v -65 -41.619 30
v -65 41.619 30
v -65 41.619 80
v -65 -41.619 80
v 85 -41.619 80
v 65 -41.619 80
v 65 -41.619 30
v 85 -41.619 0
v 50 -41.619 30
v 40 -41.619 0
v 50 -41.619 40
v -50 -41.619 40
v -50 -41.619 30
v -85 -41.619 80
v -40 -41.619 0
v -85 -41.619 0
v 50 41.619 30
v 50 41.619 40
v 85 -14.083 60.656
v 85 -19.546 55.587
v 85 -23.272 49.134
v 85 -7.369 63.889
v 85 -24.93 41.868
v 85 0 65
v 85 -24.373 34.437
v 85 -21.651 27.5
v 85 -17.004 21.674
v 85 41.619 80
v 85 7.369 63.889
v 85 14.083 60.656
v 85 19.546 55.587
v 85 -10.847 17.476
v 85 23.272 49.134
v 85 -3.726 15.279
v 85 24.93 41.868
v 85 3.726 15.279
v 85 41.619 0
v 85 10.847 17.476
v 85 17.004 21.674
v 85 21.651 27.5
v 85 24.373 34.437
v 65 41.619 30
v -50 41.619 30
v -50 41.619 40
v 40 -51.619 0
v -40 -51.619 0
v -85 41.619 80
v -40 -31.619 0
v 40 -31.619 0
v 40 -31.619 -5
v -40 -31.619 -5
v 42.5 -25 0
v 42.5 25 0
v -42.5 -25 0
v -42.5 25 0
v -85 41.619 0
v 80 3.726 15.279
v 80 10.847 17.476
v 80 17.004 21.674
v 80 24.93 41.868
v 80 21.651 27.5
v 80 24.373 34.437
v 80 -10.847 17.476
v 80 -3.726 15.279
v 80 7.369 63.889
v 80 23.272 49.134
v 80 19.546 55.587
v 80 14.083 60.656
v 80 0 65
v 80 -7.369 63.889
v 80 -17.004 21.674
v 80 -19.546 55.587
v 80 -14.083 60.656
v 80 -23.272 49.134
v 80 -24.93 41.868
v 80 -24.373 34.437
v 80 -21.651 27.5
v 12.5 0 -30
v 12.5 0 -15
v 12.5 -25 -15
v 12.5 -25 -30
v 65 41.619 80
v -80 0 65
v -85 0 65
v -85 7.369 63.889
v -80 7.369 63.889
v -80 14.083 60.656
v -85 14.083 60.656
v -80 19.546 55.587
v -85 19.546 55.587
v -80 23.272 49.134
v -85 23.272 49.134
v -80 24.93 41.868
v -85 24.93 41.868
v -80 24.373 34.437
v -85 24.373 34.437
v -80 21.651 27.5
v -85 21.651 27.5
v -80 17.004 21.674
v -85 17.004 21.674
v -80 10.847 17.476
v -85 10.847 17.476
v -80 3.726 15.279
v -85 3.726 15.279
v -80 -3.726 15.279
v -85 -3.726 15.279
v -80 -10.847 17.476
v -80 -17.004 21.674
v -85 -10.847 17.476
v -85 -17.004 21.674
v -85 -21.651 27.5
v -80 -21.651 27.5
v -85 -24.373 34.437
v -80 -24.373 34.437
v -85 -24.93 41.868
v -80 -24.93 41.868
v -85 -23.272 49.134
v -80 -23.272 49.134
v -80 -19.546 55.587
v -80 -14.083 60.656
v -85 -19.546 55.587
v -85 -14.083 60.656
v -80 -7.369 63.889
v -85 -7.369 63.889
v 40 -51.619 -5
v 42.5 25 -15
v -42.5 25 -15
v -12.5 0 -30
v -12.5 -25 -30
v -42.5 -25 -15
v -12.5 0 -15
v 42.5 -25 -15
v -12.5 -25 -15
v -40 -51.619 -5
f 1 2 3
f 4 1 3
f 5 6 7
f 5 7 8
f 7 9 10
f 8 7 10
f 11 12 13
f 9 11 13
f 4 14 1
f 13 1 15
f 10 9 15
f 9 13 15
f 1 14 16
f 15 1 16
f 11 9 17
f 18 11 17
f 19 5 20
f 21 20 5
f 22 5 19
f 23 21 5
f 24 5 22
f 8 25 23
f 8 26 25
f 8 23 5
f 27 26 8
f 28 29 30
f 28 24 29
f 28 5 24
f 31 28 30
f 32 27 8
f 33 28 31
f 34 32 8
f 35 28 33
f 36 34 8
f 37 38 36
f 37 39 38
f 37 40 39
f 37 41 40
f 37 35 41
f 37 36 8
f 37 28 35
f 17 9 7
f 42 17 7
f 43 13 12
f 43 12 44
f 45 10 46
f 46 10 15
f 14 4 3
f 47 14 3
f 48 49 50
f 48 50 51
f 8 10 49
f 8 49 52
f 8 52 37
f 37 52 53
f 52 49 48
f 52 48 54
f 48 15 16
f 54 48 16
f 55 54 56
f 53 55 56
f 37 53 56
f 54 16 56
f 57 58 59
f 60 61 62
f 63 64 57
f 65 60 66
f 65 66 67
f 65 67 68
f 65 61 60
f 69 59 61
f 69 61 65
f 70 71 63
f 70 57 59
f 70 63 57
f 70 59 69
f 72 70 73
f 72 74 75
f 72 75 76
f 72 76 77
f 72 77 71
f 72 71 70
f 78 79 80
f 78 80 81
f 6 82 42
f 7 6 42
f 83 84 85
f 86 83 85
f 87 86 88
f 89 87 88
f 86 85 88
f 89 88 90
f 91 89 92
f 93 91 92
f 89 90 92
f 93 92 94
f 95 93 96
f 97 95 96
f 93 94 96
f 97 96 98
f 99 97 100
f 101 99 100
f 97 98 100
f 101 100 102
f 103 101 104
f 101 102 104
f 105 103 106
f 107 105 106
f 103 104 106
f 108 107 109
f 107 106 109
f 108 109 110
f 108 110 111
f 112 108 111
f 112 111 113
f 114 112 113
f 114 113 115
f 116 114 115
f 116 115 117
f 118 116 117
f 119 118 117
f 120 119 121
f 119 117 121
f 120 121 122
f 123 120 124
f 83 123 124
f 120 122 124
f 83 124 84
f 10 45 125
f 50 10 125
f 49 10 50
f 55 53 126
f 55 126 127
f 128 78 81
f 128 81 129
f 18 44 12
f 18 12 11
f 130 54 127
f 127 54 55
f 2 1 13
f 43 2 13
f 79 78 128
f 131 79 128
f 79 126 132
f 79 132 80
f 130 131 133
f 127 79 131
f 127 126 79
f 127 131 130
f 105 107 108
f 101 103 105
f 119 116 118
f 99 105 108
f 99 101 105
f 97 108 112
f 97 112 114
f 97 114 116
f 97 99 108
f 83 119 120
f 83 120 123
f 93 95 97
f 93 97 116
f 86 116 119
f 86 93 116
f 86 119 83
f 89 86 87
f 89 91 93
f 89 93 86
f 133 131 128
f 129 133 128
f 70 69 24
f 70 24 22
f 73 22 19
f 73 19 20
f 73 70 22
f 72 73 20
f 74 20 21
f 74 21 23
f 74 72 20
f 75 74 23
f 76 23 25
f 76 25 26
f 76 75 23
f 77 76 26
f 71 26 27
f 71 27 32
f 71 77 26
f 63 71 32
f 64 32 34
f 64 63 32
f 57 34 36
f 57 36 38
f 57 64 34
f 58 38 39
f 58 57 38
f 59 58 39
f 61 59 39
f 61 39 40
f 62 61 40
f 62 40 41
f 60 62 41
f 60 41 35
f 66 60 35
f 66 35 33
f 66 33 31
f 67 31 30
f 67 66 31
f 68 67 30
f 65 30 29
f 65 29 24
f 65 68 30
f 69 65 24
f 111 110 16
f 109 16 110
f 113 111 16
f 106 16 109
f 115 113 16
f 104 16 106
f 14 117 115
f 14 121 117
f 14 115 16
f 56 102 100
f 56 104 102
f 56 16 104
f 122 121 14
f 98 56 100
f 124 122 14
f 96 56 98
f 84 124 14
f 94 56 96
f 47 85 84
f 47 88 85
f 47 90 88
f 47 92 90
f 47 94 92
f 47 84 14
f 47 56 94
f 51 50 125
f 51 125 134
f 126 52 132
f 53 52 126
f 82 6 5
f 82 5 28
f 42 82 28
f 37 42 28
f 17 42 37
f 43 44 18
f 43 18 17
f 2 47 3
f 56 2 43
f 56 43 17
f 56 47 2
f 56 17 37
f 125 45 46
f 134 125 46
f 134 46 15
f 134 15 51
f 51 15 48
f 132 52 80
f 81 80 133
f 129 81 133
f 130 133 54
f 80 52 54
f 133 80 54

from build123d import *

# Parameters (mm, degrees)
SKETCH1_W           = 130
SKETCH1_H           = 83.238396624
BOSS_EXTRUDE1_DEPTH = 30
SKETCH2_W           = 100
SKETCH2_H           = 83.238396624
BOSS_EXTRUDE2_DEPTH = 10
SKETCH3_W           = 80
SKETCH3_H           = 83.238396624
BOSS_EXTRUDE3_DEPTH = 20
SKETCH4_R           = 25
CUT_EXTRUDE1_DEPTH  = 5
SKETCH5_W           = 80
SKETCH5_H           = 83.238396624
BOSS_EXTRUDE4_DEPTH = 20
CUT_EXTRUDE2_START  = -5
SKETCH6_R           = 25
CUT_EXTRUDE2_DEPTH  = 5
SKETCH7_W           = 80
SKETCH7_H           = 20
BOSS_EXTRUDE5_DEPTH = 5
SKETCH8_W           = 85
SKETCH8_H           = 50
BOSS_EXTRUDE6_DEPTH = 30
SKETCH9_W           = 85
SKETCH9_H           = 25
CUT_EXTRUDE3_DEPTH  = 15
SKETCH10_W          = 30
SKETCH10_H          = 15
CUT_EXTRUDE4_DEPTH  = 128.630488655


with BuildPart() as part:
    # Sketch1 → Boss-Extrude1 (new body)
    with BuildSketch(Plane.XY):
        Rectangle(SKETCH1_W, SKETCH1_H)
    extrude(amount=BOSS_EXTRUDE1_DEPTH)

    # Sketch2 → Boss-Extrude2 (add)
    with BuildSketch(Plane.XY.offset(30)):
        Rectangle(SKETCH2_W, SKETCH2_H)
    extrude(amount=BOSS_EXTRUDE2_DEPTH)

    # Sketch3 → Boss-Extrude3 (add)
    with BuildSketch(Plane.ZY.offset(65)):
        with Locations((40, 0)):
            Rectangle(SKETCH3_W, SKETCH3_H)
    extrude(amount=BOSS_EXTRUDE3_DEPTH)

    # Sketch4 → Cut-Extrude1 (cut)
    with BuildSketch(Plane.ZY.offset(85)):
        with Locations((40, 0)):
            Circle(SKETCH4_R)
    extrude(amount=-CUT_EXTRUDE1_DEPTH, mode=Mode.SUBTRACT)

    # Sketch5 → Boss-Extrude4 (add)
    with BuildSketch(Plane(origin=(65, 0, 0), x_dir=(0, 0, -1), z_dir=(1, 0, 0))):
        with Locations((-40, 0)):
            Rectangle(SKETCH5_W, SKETCH5_H)
    extrude(amount=BOSS_EXTRUDE4_DEPTH)

    # Sketch6 → Cut-Extrude2 (cut)
    with BuildSketch(Plane(origin=(85, 0, 0), x_dir=(0, 0, -1), z_dir=(1, 0, 0)).offset(CUT_EXTRUDE2_START)):
        with Locations(Location((-40, 0, 0), (0, 0, 180))):
            Circle(SKETCH6_R)
    extrude(amount=CUT_EXTRUDE2_DEPTH, mode=Mode.SUBTRACT)

    # Sketch7 → Boss-Extrude5 (add)
    with BuildSketch(Plane(origin=(0, 0, 0), x_dir=(-1, 0, 0), z_dir=(0, 0, -1))):
        with Locations((0, -41.619198312)):
            Rectangle(SKETCH7_W, SKETCH7_H)
    extrude(amount=BOSS_EXTRUDE5_DEPTH)

    # Sketch8 → Boss-Extrude6 (add)
    with BuildSketch(Plane(origin=(0, 0, 0), x_dir=(-1, 0, 0), z_dir=(0, 0, -1))):
        Rectangle(SKETCH8_W, SKETCH8_H)
    extrude(amount=BOSS_EXTRUDE6_DEPTH)

    # Sketch9 → Cut-Extrude3 (cut)
    with BuildSketch(Plane(origin=(0, 0, -30), x_dir=(-1, 0, 0), z_dir=(0, 0, -1))):
        with Locations((0, 12.5)):
            Rectangle(SKETCH9_W, SKETCH9_H)
    extrude(amount=-CUT_EXTRUDE3_DEPTH, mode=Mode.SUBTRACT)

    # Sketch10 → Cut-Extrude4 (cut, through all)
    with BuildSketch(Plane(origin=(0, 0, 0), x_dir=(1, 0, 0), z_dir=(0, 1, 0))):
        with Locations((-27.5, 22.5)):
            Rectangle(SKETCH10_W, SKETCH10_H)
        with Locations((27.5, 22.5)):
            Rectangle(SKETCH10_W, SKETCH10_H)
    extrude(amount=-CUT_EXTRUDE4_DEPTH, mode=Mode.SUBTRACT)


solid = part.part
